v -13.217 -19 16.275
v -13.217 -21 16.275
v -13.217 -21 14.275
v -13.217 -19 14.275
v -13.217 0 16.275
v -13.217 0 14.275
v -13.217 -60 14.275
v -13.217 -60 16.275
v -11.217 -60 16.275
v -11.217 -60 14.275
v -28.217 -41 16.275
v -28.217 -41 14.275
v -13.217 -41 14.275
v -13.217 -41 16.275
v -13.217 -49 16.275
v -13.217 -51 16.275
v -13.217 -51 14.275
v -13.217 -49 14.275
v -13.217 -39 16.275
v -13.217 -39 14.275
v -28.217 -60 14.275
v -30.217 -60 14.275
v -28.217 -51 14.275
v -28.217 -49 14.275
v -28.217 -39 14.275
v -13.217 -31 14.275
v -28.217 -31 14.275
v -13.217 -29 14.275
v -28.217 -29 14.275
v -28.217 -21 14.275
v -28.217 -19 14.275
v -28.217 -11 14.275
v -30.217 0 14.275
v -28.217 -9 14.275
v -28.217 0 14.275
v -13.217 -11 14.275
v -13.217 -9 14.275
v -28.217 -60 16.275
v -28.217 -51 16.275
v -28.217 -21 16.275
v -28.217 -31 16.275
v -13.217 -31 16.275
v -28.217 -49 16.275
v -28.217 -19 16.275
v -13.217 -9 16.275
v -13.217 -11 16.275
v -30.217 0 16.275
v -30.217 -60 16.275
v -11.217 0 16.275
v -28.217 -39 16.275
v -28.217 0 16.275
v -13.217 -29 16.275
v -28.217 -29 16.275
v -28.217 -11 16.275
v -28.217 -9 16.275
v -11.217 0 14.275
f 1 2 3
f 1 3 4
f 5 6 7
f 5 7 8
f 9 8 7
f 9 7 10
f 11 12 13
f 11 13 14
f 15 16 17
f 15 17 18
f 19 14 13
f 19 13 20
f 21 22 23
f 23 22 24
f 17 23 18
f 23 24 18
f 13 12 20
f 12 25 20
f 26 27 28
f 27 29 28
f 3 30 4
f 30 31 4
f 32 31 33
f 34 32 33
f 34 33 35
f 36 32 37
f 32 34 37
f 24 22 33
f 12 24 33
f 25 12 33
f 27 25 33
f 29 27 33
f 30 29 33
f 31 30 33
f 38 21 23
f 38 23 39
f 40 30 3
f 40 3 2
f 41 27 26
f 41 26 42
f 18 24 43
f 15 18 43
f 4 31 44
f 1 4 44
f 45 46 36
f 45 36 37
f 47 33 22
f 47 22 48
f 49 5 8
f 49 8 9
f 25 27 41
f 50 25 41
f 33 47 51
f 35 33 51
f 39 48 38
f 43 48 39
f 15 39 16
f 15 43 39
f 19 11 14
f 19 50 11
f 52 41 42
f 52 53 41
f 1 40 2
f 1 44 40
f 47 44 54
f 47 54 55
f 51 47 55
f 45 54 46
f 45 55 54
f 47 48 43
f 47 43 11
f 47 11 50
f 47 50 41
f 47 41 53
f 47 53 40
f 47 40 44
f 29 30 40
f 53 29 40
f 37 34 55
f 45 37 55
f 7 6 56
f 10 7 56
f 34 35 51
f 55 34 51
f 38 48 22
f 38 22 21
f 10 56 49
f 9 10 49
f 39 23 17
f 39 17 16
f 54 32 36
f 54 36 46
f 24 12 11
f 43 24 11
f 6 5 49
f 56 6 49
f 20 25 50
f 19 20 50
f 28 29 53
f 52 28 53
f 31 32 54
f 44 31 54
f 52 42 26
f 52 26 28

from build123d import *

# Parameters (mm, degrees)
F0_W     = 2
F0_H     = 2
F1_DEPTH = 60
F2_W     = 2
F2_H     = 2
F3_DEPTH = 15


with BuildPart() as f1:
    # F0 (on Front) → F1 (new body)
    with BuildSketch(Plane.XZ):
        with Locations((-29.2174071148, 15.274727294)):
            Rectangle(F0_W, F0_H)
    extrude(amount=F1_DEPTH)

    # F2 (on face) → F3 (join)
    with BuildSketch(Plane.YZ.offset(-28.2174071148)):
        with Locations((-50, 15.274727294)):
            Rectangle(F2_W, F2_H)
        with Locations((-40, 15.274727294)):
            Rectangle(F2_W, F2_H)
        with Locations((-30, 15.274727294)):
            Rectangle(F2_W, F2_H)
        with Locations((-20, 15.274727294)):
            Rectangle(F2_W, F2_H)
        with Locations((-10, 15.274727294)):
            Rectangle(F2_W, F2_H)
    extrude(amount=F3_DEPTH)


with BuildPart() as f1b:
    # F0 (on Front) → F1, piece 2 (new body)
    with BuildSketch(Plane.XZ):
        with Locations((-12.2174071148, 15.274727294)):
            Rectangle(F0_W, F0_H)
    extrude(amount=F1_DEPTH)


solid = Compound([f1.part, f1b.part])
